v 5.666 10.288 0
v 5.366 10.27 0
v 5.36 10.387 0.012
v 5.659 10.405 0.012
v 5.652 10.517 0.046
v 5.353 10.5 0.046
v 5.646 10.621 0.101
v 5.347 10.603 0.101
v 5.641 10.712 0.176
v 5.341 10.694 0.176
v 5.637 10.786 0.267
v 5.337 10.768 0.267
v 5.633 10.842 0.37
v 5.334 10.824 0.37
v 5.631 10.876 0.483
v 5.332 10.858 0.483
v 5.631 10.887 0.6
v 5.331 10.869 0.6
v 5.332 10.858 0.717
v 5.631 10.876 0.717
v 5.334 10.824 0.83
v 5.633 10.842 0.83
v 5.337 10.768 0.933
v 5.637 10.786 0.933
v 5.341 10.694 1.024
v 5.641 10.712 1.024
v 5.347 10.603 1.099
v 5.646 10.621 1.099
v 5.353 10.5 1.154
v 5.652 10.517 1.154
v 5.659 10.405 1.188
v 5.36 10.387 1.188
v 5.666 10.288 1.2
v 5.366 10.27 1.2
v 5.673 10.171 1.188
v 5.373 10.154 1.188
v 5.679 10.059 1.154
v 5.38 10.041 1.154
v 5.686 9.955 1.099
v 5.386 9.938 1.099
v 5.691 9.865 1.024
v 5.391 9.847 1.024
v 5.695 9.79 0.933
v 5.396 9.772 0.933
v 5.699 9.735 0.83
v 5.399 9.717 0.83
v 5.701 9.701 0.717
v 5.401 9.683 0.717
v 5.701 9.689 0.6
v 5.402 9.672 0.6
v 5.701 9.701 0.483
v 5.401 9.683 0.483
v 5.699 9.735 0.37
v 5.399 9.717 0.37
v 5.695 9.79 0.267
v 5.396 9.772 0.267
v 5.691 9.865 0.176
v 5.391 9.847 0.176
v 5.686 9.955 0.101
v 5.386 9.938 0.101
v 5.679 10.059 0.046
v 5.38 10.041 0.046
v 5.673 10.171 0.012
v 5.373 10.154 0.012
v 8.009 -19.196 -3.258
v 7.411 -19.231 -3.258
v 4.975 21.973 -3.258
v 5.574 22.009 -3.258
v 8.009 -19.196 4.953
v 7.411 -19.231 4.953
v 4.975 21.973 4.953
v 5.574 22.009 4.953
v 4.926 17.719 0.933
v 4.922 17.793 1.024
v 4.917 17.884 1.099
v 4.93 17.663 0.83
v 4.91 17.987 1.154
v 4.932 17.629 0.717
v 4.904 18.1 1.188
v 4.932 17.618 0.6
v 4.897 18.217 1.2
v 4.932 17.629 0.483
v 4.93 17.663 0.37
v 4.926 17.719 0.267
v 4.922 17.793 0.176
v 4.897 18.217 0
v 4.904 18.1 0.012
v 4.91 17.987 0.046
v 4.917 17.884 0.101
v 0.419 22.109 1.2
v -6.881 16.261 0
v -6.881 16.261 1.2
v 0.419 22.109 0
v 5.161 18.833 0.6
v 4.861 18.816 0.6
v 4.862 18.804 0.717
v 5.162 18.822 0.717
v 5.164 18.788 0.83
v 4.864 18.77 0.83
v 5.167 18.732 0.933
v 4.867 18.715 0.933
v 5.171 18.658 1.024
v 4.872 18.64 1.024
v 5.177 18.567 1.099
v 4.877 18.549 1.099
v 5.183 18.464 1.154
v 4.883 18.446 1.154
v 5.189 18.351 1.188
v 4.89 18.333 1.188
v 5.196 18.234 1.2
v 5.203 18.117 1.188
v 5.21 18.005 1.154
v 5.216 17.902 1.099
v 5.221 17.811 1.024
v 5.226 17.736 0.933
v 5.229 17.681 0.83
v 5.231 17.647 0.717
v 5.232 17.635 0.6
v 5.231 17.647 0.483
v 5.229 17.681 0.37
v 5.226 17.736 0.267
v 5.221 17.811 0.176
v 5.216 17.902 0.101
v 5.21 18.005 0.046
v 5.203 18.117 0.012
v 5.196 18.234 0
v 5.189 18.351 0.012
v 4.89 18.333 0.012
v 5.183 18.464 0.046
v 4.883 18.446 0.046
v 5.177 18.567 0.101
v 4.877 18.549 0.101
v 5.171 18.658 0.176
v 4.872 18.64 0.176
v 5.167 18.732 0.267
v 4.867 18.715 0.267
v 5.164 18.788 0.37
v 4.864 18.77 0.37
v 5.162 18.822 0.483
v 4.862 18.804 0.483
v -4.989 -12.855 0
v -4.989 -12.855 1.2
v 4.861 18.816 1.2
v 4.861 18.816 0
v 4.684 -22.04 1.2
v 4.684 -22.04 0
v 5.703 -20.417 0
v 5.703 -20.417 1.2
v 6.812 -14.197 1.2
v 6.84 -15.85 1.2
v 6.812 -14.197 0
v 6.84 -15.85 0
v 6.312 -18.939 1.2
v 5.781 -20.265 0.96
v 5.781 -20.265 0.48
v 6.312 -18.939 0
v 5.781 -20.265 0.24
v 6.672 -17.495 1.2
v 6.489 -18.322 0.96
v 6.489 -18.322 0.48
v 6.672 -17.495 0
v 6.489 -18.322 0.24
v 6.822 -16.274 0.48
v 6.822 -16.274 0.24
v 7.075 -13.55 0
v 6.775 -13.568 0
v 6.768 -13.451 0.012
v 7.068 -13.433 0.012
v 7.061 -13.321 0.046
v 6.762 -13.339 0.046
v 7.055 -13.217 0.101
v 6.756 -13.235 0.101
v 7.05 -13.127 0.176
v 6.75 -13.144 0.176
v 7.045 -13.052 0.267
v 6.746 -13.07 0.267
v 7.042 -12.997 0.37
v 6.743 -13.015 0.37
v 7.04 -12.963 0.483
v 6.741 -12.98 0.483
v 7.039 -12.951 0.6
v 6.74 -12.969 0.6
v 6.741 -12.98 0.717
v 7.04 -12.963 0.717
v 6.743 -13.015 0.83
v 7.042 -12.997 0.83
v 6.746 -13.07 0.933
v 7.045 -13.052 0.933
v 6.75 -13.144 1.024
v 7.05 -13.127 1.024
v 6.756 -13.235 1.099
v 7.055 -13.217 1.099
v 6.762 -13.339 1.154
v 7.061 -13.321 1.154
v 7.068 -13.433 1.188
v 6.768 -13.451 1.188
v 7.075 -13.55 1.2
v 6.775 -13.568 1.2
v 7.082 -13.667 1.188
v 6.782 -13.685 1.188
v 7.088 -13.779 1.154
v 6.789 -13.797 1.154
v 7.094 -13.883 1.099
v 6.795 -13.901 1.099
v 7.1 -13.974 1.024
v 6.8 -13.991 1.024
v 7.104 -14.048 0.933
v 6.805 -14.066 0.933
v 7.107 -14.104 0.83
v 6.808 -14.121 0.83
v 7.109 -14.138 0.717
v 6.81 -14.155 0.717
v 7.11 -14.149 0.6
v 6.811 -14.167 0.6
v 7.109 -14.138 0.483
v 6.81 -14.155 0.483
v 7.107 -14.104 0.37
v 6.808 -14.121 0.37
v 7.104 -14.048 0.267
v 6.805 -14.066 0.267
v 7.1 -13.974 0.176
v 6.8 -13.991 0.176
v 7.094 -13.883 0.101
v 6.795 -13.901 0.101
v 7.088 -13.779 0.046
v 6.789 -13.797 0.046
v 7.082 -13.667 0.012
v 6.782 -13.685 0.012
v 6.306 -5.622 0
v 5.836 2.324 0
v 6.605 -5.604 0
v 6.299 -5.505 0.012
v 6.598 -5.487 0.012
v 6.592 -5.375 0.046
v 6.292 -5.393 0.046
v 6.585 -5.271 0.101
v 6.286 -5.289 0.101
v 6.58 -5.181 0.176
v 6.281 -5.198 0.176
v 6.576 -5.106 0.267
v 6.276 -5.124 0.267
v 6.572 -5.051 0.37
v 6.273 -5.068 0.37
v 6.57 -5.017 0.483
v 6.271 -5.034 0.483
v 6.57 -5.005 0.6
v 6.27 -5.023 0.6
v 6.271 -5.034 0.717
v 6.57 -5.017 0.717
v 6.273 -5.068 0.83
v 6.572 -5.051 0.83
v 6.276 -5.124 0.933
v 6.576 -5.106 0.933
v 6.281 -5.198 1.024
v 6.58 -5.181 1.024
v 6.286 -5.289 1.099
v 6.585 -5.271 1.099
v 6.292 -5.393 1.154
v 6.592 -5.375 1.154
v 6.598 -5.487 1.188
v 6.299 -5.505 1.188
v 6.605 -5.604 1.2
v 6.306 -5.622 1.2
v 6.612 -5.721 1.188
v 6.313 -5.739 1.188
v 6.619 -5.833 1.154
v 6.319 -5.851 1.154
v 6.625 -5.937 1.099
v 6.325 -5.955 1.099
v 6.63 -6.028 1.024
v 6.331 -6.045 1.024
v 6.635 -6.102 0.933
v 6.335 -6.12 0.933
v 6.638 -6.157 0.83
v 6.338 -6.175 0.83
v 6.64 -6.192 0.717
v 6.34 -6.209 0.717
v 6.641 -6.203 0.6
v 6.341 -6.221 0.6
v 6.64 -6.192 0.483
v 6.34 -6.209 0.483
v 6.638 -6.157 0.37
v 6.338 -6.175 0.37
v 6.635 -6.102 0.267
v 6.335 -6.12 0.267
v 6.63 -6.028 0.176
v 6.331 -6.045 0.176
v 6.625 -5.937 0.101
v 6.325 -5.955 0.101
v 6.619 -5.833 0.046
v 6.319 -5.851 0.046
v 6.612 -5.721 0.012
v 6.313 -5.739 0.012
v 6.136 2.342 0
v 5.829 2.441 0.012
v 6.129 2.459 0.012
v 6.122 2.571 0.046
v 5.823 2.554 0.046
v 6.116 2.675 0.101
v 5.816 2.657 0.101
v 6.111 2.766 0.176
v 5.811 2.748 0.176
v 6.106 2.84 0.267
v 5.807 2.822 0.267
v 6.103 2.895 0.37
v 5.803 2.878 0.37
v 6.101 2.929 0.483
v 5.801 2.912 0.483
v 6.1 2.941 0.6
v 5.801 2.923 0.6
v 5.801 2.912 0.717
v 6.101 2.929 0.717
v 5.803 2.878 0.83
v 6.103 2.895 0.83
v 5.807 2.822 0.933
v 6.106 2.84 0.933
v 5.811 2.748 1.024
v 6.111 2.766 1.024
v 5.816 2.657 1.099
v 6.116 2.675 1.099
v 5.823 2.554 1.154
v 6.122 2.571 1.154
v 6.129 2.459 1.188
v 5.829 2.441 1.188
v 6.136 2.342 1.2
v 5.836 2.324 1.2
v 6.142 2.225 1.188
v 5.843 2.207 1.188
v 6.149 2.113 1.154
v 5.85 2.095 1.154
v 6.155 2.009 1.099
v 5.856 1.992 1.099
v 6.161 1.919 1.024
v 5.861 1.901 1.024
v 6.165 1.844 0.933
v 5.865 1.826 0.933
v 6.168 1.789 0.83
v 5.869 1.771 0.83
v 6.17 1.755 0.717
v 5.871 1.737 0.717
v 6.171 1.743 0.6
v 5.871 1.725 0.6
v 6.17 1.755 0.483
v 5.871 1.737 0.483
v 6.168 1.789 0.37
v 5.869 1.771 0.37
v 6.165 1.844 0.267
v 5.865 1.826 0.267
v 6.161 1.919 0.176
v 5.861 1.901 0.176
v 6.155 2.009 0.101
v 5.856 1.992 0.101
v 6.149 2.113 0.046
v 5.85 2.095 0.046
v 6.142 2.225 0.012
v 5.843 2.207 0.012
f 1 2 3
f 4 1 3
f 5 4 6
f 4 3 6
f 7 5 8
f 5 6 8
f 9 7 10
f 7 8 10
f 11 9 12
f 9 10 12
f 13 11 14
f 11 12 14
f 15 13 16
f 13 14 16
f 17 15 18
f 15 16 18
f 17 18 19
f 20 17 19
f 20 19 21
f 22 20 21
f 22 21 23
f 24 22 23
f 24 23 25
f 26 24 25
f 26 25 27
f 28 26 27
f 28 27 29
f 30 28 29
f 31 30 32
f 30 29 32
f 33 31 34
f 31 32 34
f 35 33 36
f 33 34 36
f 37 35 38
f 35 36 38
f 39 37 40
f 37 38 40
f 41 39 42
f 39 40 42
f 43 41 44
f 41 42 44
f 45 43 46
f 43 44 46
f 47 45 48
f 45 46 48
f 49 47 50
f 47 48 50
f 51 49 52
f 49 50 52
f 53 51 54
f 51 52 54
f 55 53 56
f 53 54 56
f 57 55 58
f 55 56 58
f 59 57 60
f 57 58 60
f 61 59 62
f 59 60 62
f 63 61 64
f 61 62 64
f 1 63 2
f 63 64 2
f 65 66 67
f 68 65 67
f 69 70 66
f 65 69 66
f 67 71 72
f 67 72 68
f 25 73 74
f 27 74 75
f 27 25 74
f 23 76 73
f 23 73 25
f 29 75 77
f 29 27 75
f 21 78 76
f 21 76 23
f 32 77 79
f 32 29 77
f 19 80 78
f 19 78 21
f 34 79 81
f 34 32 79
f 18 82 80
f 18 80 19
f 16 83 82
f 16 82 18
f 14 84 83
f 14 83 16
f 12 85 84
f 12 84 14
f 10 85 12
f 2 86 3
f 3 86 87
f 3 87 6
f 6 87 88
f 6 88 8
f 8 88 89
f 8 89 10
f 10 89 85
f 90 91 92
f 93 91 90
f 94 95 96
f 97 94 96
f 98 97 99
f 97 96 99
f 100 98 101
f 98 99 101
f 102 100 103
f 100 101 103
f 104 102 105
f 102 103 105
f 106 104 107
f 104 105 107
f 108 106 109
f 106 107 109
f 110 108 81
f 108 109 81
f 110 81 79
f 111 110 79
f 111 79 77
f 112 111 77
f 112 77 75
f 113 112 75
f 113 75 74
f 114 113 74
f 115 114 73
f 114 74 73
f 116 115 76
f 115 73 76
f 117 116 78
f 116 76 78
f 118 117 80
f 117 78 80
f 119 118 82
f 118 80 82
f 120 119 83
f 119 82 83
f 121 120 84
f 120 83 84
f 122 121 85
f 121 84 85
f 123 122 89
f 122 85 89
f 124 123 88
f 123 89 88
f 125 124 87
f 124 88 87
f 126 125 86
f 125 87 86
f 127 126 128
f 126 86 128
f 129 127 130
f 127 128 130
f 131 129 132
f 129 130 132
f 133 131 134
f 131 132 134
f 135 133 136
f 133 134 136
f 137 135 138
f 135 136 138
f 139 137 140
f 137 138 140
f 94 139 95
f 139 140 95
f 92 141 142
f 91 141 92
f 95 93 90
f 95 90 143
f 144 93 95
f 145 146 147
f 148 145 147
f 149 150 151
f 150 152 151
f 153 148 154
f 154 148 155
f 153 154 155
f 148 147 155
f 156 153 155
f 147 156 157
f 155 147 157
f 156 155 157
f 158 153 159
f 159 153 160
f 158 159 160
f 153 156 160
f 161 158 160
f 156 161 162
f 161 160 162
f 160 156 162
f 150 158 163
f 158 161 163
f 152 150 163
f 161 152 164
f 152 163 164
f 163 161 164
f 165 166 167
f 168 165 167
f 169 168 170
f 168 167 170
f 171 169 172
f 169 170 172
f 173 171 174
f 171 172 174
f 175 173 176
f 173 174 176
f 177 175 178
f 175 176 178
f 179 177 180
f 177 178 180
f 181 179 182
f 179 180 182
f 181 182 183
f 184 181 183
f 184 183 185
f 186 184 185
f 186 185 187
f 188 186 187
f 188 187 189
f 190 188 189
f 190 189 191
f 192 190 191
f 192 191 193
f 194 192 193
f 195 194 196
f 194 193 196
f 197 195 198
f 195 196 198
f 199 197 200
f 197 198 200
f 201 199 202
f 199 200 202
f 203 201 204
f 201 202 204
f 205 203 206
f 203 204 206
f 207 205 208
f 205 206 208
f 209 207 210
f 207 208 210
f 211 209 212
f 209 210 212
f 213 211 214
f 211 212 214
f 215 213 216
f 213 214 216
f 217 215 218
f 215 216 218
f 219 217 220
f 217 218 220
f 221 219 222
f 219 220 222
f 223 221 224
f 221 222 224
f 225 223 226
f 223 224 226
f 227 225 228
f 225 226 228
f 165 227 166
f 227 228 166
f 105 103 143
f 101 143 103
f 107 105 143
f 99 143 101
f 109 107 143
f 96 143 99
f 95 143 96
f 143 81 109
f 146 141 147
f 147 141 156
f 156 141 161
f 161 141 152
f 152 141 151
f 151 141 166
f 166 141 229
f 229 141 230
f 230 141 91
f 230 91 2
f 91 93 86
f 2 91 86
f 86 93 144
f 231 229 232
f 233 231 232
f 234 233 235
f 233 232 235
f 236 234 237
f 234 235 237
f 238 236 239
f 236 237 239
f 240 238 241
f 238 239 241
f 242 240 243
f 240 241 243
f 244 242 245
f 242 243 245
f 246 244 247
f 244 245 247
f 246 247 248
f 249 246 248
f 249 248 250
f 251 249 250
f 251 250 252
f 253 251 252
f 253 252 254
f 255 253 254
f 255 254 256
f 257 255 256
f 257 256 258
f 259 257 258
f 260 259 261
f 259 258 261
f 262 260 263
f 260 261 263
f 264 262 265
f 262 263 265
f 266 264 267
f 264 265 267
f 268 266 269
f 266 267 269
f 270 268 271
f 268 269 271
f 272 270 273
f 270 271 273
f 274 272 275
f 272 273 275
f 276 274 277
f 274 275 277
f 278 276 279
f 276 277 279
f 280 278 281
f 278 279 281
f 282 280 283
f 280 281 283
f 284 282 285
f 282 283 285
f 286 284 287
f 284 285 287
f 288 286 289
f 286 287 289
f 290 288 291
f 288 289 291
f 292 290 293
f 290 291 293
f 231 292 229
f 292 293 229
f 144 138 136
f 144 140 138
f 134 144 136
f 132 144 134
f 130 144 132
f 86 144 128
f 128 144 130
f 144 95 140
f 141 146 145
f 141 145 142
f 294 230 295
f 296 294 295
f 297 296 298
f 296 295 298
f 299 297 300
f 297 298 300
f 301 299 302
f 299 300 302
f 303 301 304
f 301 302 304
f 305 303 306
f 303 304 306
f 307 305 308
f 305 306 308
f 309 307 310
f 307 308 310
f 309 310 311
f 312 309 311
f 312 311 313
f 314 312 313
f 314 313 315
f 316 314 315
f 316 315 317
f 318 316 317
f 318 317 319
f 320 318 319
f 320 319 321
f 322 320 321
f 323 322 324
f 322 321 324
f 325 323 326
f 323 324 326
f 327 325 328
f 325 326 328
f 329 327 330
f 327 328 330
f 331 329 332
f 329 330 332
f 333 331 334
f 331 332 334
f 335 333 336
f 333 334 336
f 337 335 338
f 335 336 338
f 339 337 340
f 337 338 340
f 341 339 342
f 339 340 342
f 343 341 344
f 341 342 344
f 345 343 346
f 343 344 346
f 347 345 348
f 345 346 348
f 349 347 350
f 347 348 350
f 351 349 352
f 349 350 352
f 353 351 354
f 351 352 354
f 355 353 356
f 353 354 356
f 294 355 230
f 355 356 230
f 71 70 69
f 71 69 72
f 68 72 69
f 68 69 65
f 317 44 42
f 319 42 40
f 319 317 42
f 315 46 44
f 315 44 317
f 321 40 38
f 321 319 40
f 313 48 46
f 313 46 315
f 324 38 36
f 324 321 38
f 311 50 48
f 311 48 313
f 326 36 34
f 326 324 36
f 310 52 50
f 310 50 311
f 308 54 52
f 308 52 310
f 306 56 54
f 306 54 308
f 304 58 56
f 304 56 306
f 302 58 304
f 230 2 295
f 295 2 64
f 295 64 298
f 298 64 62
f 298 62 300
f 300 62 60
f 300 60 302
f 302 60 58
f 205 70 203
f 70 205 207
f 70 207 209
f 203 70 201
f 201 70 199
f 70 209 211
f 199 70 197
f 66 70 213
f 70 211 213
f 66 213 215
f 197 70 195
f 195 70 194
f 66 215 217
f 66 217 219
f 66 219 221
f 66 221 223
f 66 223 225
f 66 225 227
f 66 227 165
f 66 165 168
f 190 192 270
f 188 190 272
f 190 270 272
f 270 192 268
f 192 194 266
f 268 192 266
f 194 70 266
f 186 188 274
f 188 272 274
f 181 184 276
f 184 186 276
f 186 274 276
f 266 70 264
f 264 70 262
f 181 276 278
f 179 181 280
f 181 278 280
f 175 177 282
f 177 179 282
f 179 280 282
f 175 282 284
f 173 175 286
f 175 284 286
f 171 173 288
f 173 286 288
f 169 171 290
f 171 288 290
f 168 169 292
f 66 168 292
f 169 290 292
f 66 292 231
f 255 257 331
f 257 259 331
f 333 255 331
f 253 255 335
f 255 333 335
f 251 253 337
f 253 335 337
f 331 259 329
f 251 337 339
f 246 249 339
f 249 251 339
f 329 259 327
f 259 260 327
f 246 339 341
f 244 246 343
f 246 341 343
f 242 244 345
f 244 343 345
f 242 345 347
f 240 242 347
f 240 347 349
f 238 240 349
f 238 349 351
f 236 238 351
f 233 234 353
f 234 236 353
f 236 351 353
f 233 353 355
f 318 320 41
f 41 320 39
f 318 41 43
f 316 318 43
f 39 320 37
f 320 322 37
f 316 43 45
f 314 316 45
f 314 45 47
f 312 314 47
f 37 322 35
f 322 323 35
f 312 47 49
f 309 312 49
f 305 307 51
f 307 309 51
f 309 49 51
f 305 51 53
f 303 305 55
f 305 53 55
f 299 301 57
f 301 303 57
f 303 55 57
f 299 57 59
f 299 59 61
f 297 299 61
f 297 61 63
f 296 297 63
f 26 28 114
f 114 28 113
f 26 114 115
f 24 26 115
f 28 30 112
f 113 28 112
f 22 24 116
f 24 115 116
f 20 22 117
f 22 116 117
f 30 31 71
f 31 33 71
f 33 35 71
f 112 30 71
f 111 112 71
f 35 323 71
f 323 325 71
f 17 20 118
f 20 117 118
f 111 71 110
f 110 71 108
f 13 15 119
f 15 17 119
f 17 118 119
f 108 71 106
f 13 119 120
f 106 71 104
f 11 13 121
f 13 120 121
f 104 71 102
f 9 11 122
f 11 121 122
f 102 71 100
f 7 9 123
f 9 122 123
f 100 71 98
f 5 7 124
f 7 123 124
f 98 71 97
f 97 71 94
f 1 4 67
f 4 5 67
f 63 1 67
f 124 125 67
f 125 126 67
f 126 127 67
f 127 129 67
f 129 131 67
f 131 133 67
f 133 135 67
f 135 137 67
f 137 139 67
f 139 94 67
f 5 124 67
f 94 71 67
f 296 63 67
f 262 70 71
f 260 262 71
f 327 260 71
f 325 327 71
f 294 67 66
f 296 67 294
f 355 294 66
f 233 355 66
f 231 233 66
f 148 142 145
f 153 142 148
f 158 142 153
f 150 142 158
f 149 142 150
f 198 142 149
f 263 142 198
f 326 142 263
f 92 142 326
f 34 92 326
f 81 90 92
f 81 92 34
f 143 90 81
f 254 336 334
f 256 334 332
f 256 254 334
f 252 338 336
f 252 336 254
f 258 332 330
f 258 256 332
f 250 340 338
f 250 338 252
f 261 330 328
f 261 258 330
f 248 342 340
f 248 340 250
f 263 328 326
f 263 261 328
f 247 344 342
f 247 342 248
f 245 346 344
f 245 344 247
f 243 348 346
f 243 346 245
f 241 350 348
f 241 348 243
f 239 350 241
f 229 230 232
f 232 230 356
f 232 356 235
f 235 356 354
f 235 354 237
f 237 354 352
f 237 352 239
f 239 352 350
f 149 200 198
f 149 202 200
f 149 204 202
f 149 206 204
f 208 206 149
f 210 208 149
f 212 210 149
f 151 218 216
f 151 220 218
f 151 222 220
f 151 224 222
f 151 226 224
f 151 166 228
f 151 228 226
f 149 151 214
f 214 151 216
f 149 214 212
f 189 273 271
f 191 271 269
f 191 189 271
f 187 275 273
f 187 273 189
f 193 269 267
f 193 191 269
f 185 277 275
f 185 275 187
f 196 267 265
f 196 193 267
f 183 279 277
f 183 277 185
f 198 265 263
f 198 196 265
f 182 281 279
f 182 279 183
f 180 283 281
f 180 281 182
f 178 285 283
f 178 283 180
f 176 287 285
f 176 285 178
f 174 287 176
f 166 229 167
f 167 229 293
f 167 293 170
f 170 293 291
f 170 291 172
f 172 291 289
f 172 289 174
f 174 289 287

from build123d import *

# Parameters (mm, degrees)
EXTRUDE_1_DEPTH     = 1.2
CUT_EXTRUDE_START   = -1.2
CUT_EXTRUDE_1_DEPTH = 1.2
SKETCH_3_R          = 0.6
EXTRUDE_2_DEPTH     = 0.3
SKETCH_4_W          = 8.210741719
SKETCH_4_H          = 41.276753536
EXTRUDE_3_DEPTH     = 0.6


# Read off the part's stored shape, not the designer's step: Вырез-Вытянуть-Тонкостенный1
with BuildPart() as part:
    # Эскиз1 → Бобышка-Вытянуть1 (new body)
    with BuildSketch(Plane.XY):
        with BuildLine():
            Line((5.249737614, 19.025640721), (0.409977198, 22.613738961))
            Line((0.409977198, 22.613738961), (-7.294059401, 16.443030035))
            Line((-7.294059401, 16.443030035), (-5.378470688, -13.036872049))
            Line((-5.378470688, -13.036872049), (4.707402929, -22.613738961))
            Line((4.707402929, -22.613738961), (4.977734505, -22.318831787))
            add(Edge.make_bspline(
                [(4.977734505, -22.318831787), (5.380257217, -21.730973812), (6.179089351, -20.564331963), (6.904763741, -18.546948907), (7.294059401, -16.401738794), (7.239811, -14.930944587), (7.212045754, -14.178167322)],
                knots=[0, 0, 0, 0, 0.246766883, 0.489724704, 0.738832503, 1, 1, 1, 1], degree=3))
            Line((7.212045754, -14.178167322), (5.249737614, 19.025640721))
        make_face()
    extrude(amount=EXTRUDE_1_DEPTH)

    # Вырез-Вытянуть-Тонкостенный1 outline → Вырез-Вытянуть-Тонкостенный1 (cut)
    with BuildSketch(Plane.XY.offset(1.2).offset(CUT_EXTRUDE_START)):
        with BuildLine():
            Line((4.707402929, -22.613738961), (4.977734505, -22.318831787))
            add(Edge.make_bspline(
                [(4.977734505, -22.318831787), (5.380257217, -21.730973812), (6.179089351, -20.564331963), (6.904763741, -18.546948907), (7.294059401, -16.401738794), (7.239811, -14.930944587), (7.212045754, -14.178167322)],
                knots=[0, 0, 0, 0, 0.246766883, 0.489724704, 0.738832503, 1, 1, 1, 1], degree=3))
            Line((7.212045754, -14.178167322), (5.249737614, 19.025640721))
            Line((5.249737614, 19.025640721), (0.409977198, 22.613738961))
            Line((0.409977198, 22.613738961), (-7.294059401, 16.443030035))
            Line((-7.294059401, 16.443030035), (-5.378470688, -13.036872049))
            Line((-5.378470688, -13.036872049), (4.707402929, -22.613738961))
        make_face()
        with BuildLine():
            add(Edge.make_bspline(
                [(4.683954221, -22.039877798), (5.077205265, -21.465418253), (5.469505076, -20.890370995), (6.092414375, -19.640377114), (6.316902906, -18.988458608), (6.575666444, -17.98832874), (6.648049215, -17.650841196), (6.760734776, -16.966359137), (6.800621162, -16.619708847), (6.864229804, -15.582878491), (6.838032295, -14.890102205), (6.812480945, -14.197340575)],
                knots=[0, 0, 0, 0, 0.25, 0.25, 0.5, 0.5, 0.625, 0.625, 0.75, 0.75, 1, 1, 1, 1], degree=3))
            Line((4.683954221, -22.039877798), (-4.989468001, -12.854646977))
            Line((-4.989468001, -12.854646977), (-6.881392269, 16.261071759))
            Line((-6.881392269, 16.261071759), (0.419413416, 22.108804468))
            Line((0.419413416, 22.108804468), (4.861454817, 18.815566877))
            Line((4.861454817, 18.815566877), (6.812480945, -14.197340575))
        make_face(mode=Mode.SUBTRACT)
    extrude(amount=CUT_EXTRUDE_1_DEPTH, mode=Mode.SUBTRACT)

    # Эскиз3 → Бобышка-Вытянуть2 (add)
    with BuildSketch(Plane(origin=(5.952643232, 0.351794597, 0), x_dir=(0, 0, -1), z_dir=(0.9982582219819068, 0.05899595109430813, 0))):
        with Locations(Location((-0.6, 17.895988185, 0), (0, 0, 90))):
            Circle(SKETCH_3_R)
        with Locations((-0.6, 9.935988185)):
            Circle(SKETCH_3_R)
        with Locations((-0.6, 1.975988185)):
            Circle(SKETCH_3_R)
        with Locations((-0.6, -5.984011815)):
            Circle(SKETCH_3_R)
        with Locations((-0.6, -13.944011815)):
            Circle(SKETCH_3_R)
    extrude(amount=EXTRUDE_2_DEPTH)

    # Эскиз4 → Бобышка-Вытянуть3 (add)
    with BuildSketch(Plane(origin=(6.252120699, 0.369493382, 0), x_dir=(0, 0, -1), z_dir=(0.9982582219819068, 0.05899595109430812, 0))):
        with Locations((-0.847450423, 1.003287523)):
            Rectangle(SKETCH_4_W, SKETCH_4_H)
    extrude(amount=EXTRUDE_3_DEPTH)


solid = part.part
